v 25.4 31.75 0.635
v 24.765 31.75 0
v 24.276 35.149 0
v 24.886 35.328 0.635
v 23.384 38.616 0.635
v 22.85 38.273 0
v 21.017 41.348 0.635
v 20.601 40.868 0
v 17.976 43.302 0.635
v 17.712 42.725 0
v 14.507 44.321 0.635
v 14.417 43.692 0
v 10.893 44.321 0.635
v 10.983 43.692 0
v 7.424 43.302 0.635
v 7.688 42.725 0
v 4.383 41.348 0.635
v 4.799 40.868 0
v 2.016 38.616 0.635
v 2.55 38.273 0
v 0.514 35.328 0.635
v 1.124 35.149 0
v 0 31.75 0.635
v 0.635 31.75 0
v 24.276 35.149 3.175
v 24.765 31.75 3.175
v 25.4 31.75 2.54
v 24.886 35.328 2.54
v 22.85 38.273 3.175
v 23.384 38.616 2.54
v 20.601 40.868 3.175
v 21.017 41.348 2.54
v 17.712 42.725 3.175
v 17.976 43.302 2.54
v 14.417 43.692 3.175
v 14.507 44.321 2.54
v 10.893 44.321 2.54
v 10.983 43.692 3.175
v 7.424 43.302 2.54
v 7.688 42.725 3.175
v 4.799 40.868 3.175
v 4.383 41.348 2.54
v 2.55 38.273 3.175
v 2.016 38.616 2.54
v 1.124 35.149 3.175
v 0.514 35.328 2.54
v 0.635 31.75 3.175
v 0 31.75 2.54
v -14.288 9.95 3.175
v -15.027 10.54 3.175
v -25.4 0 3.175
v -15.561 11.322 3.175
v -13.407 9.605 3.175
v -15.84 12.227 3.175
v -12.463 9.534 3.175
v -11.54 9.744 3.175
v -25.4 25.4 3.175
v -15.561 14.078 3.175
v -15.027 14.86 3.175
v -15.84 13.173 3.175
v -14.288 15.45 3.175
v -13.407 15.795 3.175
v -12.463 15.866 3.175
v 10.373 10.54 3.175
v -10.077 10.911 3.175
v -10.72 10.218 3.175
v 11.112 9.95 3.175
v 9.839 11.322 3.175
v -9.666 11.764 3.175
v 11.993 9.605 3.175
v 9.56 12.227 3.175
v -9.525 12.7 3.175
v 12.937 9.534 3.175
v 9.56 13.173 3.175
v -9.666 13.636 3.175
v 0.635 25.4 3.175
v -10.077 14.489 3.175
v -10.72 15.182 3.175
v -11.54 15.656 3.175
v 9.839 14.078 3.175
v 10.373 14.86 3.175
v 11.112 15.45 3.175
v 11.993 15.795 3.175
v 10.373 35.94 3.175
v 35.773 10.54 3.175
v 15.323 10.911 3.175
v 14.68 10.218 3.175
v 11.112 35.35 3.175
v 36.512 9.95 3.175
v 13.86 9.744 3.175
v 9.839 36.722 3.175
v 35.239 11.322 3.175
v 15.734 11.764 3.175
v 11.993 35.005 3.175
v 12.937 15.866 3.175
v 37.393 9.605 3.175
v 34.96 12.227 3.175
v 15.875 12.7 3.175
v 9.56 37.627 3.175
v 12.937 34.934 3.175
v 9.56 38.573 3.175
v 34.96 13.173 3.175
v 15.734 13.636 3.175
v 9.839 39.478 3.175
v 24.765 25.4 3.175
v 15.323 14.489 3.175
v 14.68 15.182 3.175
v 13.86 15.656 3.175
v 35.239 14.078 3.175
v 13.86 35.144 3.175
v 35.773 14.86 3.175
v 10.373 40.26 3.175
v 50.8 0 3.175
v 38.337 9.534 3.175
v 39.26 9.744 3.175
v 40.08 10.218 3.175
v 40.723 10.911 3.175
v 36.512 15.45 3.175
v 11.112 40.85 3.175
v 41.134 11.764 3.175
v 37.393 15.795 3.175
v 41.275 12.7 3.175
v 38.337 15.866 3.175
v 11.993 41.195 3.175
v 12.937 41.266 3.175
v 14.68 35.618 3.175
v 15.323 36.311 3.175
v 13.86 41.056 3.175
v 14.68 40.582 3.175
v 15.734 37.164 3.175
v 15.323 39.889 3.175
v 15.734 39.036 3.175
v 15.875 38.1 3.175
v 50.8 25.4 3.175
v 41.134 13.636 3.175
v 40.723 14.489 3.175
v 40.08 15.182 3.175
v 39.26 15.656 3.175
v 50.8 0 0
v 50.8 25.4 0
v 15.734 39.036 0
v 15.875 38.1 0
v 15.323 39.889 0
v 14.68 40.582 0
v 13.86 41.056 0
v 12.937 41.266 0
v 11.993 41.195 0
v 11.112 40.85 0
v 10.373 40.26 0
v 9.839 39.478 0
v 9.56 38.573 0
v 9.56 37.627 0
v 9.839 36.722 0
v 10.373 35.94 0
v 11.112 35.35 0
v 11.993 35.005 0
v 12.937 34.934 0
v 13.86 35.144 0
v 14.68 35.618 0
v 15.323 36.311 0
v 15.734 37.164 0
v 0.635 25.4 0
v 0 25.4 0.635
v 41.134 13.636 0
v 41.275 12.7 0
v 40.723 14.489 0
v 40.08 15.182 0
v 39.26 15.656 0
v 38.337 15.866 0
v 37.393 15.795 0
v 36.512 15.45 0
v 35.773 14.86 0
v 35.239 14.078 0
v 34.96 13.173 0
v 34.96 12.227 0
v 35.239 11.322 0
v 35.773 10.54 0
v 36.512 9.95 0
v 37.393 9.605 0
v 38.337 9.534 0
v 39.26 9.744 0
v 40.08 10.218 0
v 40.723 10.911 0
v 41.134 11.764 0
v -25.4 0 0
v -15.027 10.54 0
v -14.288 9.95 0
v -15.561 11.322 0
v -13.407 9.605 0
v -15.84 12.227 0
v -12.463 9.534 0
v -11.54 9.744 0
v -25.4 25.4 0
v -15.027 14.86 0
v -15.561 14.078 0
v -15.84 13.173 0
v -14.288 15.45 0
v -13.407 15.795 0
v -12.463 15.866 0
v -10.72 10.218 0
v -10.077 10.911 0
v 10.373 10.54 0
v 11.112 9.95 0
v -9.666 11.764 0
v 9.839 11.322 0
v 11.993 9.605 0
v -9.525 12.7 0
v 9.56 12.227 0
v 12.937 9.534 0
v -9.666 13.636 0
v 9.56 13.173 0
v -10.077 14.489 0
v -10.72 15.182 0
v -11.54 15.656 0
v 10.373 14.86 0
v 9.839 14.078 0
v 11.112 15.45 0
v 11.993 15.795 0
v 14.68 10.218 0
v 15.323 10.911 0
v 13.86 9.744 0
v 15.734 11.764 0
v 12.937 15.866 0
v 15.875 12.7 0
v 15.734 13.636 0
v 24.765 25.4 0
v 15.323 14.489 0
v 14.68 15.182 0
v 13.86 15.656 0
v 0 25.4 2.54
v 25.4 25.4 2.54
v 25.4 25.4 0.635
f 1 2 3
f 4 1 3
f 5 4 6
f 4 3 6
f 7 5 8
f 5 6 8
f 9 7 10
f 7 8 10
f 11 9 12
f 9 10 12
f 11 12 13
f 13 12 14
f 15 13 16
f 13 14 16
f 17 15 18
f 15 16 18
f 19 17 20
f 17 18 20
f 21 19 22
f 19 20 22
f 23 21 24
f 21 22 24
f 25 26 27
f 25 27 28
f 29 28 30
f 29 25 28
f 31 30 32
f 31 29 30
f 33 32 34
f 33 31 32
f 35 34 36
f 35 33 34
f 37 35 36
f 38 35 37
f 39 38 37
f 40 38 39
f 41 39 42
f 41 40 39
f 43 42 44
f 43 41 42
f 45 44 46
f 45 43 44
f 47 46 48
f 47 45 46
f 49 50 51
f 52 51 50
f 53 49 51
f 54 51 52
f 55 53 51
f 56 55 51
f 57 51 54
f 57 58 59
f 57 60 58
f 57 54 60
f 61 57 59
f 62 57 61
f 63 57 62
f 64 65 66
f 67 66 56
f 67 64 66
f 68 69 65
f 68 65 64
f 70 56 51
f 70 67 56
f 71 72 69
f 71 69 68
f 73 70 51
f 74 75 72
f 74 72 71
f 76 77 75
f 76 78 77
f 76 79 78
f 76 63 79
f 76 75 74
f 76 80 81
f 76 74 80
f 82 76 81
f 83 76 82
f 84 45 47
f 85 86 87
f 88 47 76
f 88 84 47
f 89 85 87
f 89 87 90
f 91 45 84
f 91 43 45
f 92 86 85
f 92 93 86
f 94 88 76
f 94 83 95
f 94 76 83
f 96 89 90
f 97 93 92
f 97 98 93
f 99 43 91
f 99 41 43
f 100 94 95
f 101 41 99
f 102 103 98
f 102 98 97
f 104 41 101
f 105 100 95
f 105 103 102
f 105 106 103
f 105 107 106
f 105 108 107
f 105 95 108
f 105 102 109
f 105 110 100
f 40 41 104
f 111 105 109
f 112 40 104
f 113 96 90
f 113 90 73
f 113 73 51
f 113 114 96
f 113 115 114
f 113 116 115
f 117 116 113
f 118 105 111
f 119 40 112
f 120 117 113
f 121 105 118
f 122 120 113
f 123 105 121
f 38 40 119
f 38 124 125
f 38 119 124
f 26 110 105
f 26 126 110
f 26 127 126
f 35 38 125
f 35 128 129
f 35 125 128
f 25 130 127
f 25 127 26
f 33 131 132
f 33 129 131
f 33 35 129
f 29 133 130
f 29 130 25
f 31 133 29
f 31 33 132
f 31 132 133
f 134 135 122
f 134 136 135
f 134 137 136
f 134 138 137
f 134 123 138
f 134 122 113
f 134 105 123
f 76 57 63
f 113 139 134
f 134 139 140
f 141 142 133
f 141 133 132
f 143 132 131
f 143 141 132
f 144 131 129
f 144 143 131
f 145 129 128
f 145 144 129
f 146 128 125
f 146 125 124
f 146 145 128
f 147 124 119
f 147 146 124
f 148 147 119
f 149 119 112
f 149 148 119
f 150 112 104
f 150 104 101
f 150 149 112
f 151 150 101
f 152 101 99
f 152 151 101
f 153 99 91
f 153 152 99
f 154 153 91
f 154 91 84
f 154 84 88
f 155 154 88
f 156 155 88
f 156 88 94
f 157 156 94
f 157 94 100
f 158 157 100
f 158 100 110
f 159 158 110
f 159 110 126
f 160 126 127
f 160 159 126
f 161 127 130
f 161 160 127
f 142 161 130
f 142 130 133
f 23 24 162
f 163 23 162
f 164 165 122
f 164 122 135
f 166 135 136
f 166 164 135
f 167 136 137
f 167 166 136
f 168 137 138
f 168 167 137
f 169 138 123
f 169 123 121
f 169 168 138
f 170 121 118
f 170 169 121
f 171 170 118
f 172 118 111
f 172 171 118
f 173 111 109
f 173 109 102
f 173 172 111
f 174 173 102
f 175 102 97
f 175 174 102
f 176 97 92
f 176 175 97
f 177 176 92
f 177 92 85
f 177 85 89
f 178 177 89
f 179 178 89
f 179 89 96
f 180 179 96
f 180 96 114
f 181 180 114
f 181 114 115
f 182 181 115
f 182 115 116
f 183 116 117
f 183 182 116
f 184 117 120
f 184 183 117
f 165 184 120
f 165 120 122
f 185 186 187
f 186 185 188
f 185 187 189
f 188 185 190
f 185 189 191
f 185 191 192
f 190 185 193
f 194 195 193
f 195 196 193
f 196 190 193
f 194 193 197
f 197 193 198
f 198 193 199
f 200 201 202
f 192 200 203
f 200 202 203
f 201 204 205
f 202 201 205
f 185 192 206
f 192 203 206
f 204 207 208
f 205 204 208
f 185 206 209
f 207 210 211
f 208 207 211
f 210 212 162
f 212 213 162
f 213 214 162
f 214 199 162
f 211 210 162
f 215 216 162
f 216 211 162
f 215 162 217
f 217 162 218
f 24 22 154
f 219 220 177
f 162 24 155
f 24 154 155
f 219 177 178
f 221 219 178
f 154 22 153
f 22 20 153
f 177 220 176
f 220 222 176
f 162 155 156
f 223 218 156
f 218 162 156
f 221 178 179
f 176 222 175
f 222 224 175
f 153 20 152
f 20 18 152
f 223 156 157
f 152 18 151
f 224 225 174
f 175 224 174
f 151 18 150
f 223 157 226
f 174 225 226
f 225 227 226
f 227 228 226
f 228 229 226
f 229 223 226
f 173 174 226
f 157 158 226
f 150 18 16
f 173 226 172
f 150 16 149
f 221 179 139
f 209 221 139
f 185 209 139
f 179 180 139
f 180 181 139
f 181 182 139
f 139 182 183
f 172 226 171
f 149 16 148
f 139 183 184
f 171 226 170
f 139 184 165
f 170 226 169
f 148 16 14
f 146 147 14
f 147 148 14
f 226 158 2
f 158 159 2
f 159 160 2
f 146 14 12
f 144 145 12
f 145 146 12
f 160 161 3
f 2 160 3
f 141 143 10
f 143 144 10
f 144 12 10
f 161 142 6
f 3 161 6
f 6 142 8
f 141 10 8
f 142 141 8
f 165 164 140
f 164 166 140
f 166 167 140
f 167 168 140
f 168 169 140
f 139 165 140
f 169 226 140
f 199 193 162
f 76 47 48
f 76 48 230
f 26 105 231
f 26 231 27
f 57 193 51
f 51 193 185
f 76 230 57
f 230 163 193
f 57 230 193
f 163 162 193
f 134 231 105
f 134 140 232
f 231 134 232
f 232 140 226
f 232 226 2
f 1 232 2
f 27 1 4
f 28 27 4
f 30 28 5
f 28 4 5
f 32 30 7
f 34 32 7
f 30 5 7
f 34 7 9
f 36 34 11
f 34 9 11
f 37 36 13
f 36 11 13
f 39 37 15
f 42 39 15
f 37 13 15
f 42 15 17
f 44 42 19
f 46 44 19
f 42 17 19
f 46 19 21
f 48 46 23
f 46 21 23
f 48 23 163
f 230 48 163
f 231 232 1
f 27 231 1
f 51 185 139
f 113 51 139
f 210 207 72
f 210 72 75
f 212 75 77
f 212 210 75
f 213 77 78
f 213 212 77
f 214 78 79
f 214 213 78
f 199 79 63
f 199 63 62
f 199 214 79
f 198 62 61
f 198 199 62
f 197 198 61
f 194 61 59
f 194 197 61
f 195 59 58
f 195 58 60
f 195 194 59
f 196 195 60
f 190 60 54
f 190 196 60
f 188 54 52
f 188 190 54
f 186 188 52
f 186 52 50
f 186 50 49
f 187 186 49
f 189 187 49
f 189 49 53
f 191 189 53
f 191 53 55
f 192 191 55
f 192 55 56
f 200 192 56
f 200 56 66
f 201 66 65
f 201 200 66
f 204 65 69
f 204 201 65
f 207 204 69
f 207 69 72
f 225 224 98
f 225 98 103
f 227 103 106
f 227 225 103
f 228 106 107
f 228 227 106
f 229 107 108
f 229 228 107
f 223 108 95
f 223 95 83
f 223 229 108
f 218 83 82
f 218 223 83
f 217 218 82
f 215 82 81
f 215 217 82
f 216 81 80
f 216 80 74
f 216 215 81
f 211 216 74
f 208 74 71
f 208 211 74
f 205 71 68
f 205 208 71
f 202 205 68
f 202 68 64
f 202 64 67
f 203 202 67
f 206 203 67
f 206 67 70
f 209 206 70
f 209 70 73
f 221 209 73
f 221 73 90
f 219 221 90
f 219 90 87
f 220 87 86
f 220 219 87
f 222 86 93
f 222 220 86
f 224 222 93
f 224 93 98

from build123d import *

# Parameters (mm, degrees)
SKETCH1_R           = 3.175
BOSS_EXTRUDE1_DEPTH = 3.175
CHAMFER2_SIZE       = 0.635


with BuildPart() as part:
    # Sketch1 → Boss-Extrude1 (new body)
    with BuildSketch(Plane.XY):
        with BuildLine():
            Line((0, 0), (25.4, 0))
            Line((25.4, 0), (50.8, 0))
            Line((50.8, 0), (50.8, 25.4))
            Line((50.8, 25.4), (25.4, 25.4))
            Line((25.4, 25.4), (25.4, 31.75))
            ThreePointArc((25.4, 31.75), (12.7, 44.45), (0, 31.75))
            Line((0, 31.75), (0, 25.4))
            Line((0, 25.4), (-25.4, 25.4))
            Line((-25.4, 25.4), (-25.4, 0))
            Line((-25.4, 0), (0, 0))
        make_face()
        with Locations((12.7, 38.1)):
            Circle(SKETCH1_R, mode=Mode.SUBTRACT)
        with Locations((12.7, 12.7)):
            Circle(SKETCH1_R, mode=Mode.SUBTRACT)
        with Locations((38.1, 12.7)):
            Circle(SKETCH1_R, mode=Mode.SUBTRACT)
        with Locations((-12.7, 12.7)):
            Circle(SKETCH1_R, mode=Mode.SUBTRACT)
    extrude(amount=BOSS_EXTRUDE1_DEPTH)

    # Chamfer2
    chamfer2_edges = [part.edges().sort_by_distance(p)[0] for p in [
        (0, 28.575, 0),
        (12.7, 44.45, 0),
        (25.4, 28.575, 0),
        (25.4, 28.575, 3.175),
        (12.7, 44.45, 3.175),
        (0, 28.575, 3.175),
    ]]
    chamfer(chamfer2_edges, length=CHAMFER2_SIZE)


solid = part.part
